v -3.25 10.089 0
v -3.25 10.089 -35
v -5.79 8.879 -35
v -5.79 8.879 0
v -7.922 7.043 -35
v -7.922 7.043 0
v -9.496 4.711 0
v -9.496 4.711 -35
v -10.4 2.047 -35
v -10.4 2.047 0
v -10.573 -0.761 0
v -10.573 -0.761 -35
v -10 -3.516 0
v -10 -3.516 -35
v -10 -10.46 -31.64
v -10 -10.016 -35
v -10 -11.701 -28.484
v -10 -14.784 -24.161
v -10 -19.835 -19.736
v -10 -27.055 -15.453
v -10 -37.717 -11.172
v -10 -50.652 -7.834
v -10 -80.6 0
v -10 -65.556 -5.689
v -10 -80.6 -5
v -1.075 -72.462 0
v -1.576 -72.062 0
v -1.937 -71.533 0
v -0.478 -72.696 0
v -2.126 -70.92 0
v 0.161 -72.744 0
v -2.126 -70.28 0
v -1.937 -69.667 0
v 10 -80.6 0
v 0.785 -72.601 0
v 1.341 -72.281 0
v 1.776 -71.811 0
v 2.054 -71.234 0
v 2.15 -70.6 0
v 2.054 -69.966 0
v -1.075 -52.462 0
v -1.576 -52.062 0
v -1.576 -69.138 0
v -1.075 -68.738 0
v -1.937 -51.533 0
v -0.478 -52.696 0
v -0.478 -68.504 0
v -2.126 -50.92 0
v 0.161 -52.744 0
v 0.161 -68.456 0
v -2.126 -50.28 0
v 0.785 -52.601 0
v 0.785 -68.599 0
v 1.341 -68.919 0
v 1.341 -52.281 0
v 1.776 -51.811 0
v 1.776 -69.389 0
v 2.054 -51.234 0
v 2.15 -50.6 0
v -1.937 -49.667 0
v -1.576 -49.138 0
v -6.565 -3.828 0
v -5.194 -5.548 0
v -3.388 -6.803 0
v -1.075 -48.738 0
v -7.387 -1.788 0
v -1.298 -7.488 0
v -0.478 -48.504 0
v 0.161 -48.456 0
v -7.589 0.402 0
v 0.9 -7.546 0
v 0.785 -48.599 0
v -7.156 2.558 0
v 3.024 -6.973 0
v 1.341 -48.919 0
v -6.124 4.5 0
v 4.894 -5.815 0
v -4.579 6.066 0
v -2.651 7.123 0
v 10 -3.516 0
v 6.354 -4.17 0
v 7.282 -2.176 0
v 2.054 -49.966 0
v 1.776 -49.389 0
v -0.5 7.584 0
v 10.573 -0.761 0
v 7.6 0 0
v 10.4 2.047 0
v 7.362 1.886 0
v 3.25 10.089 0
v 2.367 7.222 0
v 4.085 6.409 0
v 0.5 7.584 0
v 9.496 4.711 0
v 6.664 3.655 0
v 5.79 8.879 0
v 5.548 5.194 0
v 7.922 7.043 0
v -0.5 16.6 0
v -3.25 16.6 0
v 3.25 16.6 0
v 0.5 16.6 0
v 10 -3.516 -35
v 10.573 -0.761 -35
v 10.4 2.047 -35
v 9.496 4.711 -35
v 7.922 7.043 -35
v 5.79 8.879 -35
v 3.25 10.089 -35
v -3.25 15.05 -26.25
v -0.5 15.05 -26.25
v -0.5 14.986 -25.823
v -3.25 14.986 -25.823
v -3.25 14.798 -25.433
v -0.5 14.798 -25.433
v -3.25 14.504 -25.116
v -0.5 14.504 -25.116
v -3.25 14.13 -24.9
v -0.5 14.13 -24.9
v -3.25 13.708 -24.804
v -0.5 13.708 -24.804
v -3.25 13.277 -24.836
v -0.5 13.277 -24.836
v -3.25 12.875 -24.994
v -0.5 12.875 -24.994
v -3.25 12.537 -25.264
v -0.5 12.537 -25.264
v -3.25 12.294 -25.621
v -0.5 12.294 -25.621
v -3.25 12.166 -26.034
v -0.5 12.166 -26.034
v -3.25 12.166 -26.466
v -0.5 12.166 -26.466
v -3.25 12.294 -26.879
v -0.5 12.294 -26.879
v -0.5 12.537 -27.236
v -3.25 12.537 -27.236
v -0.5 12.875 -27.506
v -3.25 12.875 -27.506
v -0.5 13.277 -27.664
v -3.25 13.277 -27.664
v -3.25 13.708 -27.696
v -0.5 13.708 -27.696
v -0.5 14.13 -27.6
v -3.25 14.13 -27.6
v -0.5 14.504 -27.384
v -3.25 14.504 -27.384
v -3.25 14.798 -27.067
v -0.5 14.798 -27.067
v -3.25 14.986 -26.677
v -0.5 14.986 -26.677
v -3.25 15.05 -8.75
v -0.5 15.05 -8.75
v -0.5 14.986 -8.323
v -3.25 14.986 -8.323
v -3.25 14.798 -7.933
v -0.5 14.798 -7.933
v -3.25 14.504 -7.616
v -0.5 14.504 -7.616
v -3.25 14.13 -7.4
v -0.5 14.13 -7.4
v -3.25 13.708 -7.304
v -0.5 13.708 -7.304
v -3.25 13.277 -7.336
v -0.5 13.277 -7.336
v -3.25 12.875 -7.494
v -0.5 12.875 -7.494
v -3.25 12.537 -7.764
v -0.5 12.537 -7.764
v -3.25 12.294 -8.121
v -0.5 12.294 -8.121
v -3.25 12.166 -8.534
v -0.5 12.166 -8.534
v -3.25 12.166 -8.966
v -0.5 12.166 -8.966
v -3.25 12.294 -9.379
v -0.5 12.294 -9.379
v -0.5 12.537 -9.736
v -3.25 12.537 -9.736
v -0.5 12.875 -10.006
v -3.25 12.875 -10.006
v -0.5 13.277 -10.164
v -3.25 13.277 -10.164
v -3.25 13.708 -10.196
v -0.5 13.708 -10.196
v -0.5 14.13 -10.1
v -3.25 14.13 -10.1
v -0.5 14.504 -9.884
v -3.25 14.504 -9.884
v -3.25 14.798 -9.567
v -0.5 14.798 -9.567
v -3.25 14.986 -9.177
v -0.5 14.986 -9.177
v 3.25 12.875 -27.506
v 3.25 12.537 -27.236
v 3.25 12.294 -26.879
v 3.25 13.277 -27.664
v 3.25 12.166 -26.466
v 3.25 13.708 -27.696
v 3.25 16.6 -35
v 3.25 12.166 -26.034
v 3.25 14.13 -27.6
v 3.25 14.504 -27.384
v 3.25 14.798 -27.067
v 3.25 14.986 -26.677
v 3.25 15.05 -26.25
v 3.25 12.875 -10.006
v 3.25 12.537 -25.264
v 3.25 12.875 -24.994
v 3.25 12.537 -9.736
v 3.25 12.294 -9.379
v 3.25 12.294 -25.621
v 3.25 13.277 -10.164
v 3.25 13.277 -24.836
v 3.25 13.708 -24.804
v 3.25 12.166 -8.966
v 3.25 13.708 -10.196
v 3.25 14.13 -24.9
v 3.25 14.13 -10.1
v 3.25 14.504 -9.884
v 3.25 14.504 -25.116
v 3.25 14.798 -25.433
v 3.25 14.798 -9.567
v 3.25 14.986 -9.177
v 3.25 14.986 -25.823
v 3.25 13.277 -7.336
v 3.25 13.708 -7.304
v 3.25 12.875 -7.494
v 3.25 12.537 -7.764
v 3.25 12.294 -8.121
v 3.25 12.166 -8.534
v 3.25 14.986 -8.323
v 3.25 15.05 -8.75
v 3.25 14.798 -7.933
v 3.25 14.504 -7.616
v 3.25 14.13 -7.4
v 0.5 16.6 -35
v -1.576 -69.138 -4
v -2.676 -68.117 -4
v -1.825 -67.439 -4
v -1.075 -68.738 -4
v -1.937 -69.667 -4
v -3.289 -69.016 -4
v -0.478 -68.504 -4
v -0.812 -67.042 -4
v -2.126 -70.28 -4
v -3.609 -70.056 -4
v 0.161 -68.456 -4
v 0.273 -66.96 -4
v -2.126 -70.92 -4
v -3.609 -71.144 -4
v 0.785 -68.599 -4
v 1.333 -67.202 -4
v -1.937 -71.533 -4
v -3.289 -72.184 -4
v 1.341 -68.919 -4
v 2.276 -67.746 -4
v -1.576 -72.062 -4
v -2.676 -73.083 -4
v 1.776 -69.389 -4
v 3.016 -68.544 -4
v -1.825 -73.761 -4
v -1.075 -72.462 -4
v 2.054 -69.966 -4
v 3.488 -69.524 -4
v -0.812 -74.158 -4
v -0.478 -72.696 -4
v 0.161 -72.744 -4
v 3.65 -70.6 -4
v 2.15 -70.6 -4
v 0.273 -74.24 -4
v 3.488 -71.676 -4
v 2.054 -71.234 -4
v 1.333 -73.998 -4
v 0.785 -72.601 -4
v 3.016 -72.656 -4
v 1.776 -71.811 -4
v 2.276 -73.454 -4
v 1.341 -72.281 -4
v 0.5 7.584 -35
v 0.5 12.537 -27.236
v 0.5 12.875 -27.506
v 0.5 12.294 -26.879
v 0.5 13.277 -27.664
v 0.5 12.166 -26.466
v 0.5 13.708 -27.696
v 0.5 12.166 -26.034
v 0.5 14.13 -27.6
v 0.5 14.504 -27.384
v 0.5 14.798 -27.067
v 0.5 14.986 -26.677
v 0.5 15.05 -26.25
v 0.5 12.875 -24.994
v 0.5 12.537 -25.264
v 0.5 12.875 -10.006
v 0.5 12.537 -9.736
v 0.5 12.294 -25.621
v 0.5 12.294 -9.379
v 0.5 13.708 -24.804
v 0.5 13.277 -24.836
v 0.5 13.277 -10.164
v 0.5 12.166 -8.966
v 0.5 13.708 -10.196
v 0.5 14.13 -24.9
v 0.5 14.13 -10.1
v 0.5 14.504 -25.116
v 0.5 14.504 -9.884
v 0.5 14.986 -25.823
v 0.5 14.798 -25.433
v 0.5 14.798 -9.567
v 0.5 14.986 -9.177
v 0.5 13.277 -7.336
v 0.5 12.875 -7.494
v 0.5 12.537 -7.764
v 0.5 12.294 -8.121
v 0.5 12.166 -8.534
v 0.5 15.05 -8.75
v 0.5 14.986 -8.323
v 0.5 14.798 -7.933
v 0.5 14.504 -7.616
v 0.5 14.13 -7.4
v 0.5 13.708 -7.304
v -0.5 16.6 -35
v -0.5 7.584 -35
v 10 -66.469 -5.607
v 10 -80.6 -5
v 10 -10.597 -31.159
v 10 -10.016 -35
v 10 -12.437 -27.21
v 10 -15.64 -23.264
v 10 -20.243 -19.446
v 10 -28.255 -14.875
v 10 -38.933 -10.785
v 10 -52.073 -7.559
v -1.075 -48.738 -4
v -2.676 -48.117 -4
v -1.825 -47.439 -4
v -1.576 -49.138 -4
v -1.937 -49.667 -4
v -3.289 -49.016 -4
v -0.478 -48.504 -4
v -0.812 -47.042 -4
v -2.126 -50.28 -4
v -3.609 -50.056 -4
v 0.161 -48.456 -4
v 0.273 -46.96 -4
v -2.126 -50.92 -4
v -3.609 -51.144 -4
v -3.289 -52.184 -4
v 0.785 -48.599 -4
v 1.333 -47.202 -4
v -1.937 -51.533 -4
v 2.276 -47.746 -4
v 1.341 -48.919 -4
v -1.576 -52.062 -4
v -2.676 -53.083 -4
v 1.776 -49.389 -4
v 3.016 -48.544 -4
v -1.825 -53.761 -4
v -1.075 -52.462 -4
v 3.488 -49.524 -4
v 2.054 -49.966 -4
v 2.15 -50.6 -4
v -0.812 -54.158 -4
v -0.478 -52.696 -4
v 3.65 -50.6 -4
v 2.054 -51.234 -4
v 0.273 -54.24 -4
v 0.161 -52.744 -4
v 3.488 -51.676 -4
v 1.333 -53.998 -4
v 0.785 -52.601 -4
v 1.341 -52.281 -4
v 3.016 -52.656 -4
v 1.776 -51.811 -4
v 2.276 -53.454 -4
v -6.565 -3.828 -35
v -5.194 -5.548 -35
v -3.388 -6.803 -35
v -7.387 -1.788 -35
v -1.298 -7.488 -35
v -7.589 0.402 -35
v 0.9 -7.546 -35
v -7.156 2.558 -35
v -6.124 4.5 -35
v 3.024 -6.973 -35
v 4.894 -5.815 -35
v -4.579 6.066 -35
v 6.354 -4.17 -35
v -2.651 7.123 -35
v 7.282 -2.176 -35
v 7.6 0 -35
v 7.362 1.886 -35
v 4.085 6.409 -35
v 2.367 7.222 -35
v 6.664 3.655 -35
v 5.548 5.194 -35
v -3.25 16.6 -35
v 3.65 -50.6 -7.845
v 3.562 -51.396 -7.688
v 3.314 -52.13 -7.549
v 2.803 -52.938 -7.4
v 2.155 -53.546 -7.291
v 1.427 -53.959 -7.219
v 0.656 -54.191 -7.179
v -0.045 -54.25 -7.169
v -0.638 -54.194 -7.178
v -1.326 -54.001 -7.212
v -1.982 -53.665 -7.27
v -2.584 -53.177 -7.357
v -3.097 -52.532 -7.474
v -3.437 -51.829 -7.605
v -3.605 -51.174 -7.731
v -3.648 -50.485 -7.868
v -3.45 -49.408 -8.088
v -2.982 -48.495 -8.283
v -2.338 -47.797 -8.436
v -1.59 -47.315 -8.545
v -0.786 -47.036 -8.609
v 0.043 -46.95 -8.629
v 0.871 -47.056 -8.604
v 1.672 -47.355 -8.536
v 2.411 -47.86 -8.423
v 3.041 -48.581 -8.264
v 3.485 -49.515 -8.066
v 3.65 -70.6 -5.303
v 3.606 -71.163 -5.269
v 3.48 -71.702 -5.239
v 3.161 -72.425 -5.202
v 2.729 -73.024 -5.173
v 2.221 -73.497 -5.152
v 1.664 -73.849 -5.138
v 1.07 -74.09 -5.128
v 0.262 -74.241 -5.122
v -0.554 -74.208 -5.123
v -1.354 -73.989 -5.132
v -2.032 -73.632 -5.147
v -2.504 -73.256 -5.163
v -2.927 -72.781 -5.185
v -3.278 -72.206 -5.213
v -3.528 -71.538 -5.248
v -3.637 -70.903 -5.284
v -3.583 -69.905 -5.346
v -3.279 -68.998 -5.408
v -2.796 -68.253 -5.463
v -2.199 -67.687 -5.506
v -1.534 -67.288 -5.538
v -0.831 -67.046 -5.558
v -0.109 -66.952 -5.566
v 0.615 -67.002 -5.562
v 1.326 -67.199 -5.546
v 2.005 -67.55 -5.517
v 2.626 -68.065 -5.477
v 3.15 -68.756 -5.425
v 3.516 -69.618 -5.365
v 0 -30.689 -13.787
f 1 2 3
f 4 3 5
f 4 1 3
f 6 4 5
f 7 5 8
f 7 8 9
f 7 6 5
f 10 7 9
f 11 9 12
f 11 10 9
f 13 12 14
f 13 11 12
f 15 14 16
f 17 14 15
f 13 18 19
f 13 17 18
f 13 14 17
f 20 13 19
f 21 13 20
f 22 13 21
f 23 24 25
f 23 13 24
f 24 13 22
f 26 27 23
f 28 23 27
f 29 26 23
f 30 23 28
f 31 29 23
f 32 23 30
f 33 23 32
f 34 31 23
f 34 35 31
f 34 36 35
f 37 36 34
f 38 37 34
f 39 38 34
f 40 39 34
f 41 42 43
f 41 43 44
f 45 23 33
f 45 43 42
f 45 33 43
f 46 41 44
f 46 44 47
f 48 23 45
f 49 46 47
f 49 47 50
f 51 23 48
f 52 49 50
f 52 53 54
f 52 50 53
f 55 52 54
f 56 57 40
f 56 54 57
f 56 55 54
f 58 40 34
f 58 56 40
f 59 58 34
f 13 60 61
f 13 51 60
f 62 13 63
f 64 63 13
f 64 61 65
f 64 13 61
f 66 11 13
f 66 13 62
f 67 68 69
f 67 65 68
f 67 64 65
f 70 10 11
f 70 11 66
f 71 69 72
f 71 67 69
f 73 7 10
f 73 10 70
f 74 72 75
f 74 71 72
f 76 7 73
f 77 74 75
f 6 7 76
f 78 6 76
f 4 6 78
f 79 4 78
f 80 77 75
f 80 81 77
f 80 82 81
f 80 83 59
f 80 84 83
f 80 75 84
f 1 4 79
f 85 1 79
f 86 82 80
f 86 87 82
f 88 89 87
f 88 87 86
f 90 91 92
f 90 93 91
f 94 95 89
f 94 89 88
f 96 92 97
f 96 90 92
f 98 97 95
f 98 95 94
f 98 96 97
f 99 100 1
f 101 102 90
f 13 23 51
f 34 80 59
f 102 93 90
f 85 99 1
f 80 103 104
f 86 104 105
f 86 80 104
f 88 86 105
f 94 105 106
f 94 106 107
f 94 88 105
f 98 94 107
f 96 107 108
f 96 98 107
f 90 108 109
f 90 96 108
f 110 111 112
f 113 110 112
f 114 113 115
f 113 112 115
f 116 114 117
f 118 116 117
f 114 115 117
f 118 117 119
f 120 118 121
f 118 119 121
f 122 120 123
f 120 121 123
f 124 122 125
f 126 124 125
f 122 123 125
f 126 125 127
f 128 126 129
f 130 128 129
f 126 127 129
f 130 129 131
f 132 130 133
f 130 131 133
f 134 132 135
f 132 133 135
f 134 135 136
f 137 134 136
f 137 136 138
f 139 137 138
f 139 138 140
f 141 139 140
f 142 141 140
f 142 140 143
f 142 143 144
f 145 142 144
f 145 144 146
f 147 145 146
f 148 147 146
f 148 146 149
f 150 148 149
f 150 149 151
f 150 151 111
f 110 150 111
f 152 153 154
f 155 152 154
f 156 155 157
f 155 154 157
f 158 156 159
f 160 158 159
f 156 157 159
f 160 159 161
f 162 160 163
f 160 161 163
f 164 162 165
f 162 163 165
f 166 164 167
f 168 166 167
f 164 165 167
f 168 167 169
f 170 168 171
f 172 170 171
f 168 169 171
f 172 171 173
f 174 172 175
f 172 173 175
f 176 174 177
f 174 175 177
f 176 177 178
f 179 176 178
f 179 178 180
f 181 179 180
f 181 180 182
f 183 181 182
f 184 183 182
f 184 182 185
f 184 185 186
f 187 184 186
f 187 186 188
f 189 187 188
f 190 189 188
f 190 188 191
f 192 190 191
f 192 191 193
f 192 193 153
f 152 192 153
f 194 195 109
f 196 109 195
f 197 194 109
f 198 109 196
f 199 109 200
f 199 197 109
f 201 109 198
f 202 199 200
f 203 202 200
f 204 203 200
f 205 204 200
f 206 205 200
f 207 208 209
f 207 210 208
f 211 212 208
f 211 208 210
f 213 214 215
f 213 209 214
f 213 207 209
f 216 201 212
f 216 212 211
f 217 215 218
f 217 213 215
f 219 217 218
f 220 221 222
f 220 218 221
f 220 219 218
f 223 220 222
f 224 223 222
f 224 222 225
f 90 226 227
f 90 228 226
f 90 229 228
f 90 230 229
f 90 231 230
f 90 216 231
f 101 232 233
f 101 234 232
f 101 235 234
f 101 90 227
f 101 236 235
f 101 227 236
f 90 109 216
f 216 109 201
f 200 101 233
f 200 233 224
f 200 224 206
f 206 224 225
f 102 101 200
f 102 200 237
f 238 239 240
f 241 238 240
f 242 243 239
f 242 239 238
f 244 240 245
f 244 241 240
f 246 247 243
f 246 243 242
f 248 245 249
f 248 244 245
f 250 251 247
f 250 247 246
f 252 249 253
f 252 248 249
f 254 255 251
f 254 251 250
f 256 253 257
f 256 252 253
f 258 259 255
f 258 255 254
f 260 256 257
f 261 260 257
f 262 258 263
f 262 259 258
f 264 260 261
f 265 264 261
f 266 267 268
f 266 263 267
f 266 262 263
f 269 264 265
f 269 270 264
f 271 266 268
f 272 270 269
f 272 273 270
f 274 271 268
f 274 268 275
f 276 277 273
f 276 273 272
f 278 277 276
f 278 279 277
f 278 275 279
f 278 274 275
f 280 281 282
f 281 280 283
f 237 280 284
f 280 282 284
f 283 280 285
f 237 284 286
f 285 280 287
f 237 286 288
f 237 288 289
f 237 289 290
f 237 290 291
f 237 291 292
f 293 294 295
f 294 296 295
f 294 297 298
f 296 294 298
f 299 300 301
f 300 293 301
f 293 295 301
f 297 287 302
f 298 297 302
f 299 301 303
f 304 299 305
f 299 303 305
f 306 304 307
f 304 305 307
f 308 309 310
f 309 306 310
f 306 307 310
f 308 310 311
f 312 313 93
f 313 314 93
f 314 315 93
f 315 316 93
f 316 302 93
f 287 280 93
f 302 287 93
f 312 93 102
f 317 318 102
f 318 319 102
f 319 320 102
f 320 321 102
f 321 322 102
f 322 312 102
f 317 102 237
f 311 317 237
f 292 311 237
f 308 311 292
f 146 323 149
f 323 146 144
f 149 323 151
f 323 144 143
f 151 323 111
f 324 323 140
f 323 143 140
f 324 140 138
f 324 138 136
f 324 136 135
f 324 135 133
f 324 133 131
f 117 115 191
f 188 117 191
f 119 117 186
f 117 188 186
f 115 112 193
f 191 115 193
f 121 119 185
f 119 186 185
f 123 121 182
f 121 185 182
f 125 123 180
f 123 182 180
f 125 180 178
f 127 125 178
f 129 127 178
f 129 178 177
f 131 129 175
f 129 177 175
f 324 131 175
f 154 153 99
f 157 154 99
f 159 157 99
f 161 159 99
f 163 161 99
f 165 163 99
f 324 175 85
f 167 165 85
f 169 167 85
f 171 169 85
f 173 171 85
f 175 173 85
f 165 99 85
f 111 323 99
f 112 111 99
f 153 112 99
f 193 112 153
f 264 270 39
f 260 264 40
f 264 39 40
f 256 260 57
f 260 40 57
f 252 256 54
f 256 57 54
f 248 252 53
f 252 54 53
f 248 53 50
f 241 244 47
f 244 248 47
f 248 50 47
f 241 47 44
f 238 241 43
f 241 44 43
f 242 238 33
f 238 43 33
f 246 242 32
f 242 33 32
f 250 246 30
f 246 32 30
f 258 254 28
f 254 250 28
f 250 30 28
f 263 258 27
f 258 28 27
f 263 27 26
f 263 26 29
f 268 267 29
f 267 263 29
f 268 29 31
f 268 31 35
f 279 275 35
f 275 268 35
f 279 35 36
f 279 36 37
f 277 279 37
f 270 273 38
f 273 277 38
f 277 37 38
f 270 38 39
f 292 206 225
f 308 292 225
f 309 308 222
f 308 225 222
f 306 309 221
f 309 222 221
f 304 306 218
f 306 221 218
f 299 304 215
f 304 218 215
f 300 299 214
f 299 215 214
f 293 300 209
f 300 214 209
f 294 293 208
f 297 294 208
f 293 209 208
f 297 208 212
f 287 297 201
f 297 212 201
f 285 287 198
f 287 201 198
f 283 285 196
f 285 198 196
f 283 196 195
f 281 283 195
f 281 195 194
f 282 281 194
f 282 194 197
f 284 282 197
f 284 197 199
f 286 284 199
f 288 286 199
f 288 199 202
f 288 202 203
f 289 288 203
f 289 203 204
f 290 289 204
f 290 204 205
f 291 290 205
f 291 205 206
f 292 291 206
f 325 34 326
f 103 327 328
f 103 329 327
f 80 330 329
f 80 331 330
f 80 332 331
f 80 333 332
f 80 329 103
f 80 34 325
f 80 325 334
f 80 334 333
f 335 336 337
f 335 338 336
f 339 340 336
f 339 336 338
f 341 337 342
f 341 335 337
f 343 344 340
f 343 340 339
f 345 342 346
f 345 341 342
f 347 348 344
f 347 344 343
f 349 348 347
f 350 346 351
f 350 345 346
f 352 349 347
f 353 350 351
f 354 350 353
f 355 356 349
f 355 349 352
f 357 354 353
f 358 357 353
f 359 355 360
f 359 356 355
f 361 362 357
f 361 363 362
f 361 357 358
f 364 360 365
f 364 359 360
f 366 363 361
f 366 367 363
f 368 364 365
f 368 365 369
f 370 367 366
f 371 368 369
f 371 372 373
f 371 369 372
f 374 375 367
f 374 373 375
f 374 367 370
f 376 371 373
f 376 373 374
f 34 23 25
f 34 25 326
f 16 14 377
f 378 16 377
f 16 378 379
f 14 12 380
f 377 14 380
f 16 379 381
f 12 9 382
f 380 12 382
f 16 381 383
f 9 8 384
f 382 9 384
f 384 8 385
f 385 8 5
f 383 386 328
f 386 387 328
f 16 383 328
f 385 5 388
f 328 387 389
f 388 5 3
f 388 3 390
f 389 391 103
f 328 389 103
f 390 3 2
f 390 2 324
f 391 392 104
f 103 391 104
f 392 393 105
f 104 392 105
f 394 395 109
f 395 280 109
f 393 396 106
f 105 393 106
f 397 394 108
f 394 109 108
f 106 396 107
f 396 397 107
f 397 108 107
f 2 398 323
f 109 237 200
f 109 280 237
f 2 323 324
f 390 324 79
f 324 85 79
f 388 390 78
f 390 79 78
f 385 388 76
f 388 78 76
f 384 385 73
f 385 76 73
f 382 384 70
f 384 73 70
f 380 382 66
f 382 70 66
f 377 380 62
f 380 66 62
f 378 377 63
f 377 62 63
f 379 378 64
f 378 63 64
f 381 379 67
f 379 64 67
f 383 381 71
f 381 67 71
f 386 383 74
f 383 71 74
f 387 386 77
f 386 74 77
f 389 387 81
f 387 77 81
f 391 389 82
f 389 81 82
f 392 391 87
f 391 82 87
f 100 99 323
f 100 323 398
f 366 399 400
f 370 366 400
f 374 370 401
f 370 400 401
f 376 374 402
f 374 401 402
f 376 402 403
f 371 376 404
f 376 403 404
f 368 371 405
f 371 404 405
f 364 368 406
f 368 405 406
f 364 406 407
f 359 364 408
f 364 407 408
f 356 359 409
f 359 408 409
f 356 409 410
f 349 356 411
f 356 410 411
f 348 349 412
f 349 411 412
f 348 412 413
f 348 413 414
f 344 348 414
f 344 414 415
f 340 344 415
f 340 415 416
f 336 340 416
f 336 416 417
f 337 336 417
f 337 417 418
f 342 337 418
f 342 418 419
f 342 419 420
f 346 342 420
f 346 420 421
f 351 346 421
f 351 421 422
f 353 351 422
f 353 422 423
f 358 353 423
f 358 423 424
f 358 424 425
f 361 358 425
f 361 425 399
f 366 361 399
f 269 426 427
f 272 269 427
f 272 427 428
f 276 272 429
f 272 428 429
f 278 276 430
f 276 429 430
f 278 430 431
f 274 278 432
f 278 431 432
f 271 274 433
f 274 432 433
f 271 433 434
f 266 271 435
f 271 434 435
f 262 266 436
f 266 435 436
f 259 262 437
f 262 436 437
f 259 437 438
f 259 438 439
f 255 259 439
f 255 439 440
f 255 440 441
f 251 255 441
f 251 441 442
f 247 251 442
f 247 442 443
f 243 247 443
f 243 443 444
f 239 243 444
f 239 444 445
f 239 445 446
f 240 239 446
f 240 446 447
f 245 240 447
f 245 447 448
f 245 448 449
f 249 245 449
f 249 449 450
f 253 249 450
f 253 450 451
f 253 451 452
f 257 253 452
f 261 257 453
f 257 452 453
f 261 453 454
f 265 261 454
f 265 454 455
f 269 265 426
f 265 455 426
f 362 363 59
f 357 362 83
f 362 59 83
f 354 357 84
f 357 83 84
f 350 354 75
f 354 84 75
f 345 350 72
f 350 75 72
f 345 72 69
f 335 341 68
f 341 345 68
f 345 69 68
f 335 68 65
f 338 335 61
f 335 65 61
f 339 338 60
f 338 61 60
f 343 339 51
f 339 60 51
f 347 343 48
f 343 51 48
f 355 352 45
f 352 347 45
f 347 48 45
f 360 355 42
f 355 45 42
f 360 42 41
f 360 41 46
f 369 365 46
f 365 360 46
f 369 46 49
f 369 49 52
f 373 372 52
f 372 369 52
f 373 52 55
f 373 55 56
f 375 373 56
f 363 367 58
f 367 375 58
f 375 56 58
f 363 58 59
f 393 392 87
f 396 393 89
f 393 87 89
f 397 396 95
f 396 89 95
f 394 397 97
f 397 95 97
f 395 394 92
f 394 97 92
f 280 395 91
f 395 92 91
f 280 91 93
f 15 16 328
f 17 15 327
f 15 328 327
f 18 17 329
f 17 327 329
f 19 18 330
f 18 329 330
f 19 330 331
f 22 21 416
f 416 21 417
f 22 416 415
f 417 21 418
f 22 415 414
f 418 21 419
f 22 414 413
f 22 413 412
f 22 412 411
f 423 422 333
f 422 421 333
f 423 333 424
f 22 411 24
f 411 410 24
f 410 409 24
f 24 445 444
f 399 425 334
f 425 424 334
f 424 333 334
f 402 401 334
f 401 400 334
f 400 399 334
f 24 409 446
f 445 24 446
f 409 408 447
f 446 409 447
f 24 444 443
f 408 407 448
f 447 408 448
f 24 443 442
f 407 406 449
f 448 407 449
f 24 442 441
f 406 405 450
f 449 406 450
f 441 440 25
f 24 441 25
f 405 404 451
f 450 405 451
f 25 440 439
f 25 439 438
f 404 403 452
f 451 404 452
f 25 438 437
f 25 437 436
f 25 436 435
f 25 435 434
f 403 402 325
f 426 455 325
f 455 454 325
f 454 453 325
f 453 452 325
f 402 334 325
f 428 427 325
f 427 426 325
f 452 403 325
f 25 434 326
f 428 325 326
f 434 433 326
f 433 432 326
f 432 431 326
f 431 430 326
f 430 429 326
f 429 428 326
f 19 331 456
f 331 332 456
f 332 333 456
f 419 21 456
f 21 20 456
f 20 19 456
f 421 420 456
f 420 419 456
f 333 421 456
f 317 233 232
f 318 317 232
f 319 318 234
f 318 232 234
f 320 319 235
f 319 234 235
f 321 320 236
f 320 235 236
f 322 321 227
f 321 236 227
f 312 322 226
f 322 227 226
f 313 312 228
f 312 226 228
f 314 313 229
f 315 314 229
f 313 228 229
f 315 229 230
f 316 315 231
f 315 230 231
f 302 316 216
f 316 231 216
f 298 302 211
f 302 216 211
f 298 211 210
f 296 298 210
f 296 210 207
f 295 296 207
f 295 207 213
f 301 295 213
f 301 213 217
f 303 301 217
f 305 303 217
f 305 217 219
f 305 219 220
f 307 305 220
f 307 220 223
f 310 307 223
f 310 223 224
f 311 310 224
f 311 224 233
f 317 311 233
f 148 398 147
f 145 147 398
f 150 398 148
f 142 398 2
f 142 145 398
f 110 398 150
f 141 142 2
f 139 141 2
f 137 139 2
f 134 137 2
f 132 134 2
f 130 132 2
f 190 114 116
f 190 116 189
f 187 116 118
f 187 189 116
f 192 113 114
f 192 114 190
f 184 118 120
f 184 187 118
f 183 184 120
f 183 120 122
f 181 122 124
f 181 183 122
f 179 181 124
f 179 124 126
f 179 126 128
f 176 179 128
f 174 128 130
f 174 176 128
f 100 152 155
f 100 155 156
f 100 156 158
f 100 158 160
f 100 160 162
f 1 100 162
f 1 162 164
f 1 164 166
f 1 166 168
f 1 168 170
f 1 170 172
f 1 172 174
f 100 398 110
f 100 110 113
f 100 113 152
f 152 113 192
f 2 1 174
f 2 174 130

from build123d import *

# Parameters (mm, degrees)
F1_DEPTH  = 35
F0_R      = 7.6
F2_DEPTH  = 35
F3_R      = 2.15
F4_DEPTH  = 35.001
F5_R      = 3.65
F5_R_2    = 2.15
F6_DEPTH  = 31
F8_DEPTH  = 20.601
F9_W      = 0.5
F9_H      = 2
F10_DEPTH = 35.0010001
F11_R     = 1.45
F12_DEPTH = 13.851


with BuildPart() as f1:
    # F0 (on Top) → F1 (new body)
    with BuildSketch(Plane.XY):
        with BuildLine():
            ThreePointArc((10, -3.5156791662), (0, -10.6), (-10, -3.5156791662))
            Line((-10, -3.5156791662), (-10, -80.6))
            Line((-10, -80.6), (10, -80.6))
            Line((10, -80.6), (10, -3.5156791662))
        make_face()
    extrude(amount=-F1_DEPTH)

    # F0 (on Top) → F2 (join)
    with BuildSketch(Plane.XY):
        with BuildLine():
            Line((-3.25, 16.6), (-3.25, 10.0894747138))
            ThreePointArc((-3.25, 10.0894747138), (-9.4955609642, 4.7110850104), (-10, -3.5156791662))
            ThreePointArc((-10, -3.5156791662), (0, -10.6), (10, -3.5156791662))
            ThreePointArc((10, -3.5156791662), (9.4955609642, 4.7110850104), (3.25, 10.0894747138))
            Line((3.25, 10.0894747138), (3.25, 16.6))
            Line((3.25, 16.6), (-3.25, 16.6))
        make_face()
        Circle(F0_R, mode=Mode.SUBTRACT)
    extrude(amount=-F2_DEPTH)

    # F3 (on face) → F4 (cut, through all)
    with BuildSketch(Plane.XY):
        with Locations((0, -50.6)):
            Circle(F3_R)
        with Locations((0, -70.6)):
            Circle(F3_R)
    extrude(amount=-F4_DEPTH, mode=Mode.SUBTRACT)

    # F5 (on face) → F6 (cut)
    with BuildSketch(Plane(origin=(0, 0, -35), x_dir=(1, 0, 0), z_dir=(0, 0, -1))):
        with Locations((0, 70.6)):
            Circle(F5_R)
        with Locations((0, 70.6)):
            Circle(F5_R_2, mode=Mode.SUBTRACT)
        with Locations((0, 50.6)):
            Circle(F5_R)
        with Locations((0, 50.6)):
            Circle(F5_R_2, mode=Mode.SUBTRACT)
    extrude(amount=-F6_DEPTH, mode=Mode.SUBTRACT)

    # F7 (on face) → F8 (cut, through all)
    with BuildSketch(Plane.YZ.offset(10)):
        with BuildLine():
            Line((-80.6, -35), (-10.0156791662, -35))
            add(Edge.make_bspline(
                [(-10.0156791662, -35), (-10.0156791662, -5), (-80.6, -5)],
                knots=[0, 0, 0, 1.5707963268, 1.5707963268, 1.5707963268], degree=2, weights=[1, 0.7071067812, 1]))
            Line((-80.6, -5), (-80.6, -35))
        make_face()
    extrude(amount=-F8_DEPTH, mode=Mode.SUBTRACT)

    # F9 (on face) → F10 (cut, through all)
    with BuildSketch(Plane.XY):
        with BuildLine():
            Line((0.5, 16.6), (0, 16.6))
            Line((0, 16.6), (0, 7.6))
            ThreePointArc((0, 7.6), (0.2501355147, 7.5958825836), (0.5, 7.5835347959))
            Line((0.5, 7.5835347959), (0.5, 16.6))
        make_face()
        with BuildLine():
            Line((0, 0), (0, 7.6))
            ThreePointArc((0, 7.6), (-0.2501355147, 7.5958825836), (-0.5, 7.5835347959))
            Line((-0.5, 7.5835347959), (-0.5, 0))
            Line((-0.5, 0), (0, 0))
        make_face()
        with Locations((-0.25, 17.6)):
            Rectangle(F9_W, F9_H)
        with Locations((0.25, 17.6)):
            Rectangle(F9_W, F9_H)
        with BuildLine():
            ThreePointArc((0.5, 7.5835347959), (0.2501355147, 7.5958825836), (0, 7.6))
            Line((0, 7.6), (0, 0))
            Line((0, 0), (0.5, 0))
            Line((0.5, 0), (0.5, 7.5835347959))
        make_face()
        with BuildLine():
            Line((0, 7.6), (0, 16.6))
            Line((0, 16.6), (-0.5, 16.6))
            Line((-0.5, 16.6), (-0.5, 7.5835347959))
            ThreePointArc((-0.5, 7.5835347959), (-0.2501355147, 7.5958825836), (0, 7.6))
        make_face()
    extrude(amount=-F10_DEPTH, mode=Mode.SUBTRACT)

    # F11 (on face) → F12 (cut, through all)
    with BuildSketch(Plane.YZ.offset(3.25)):
        with Locations((13.6, -8.75)):
            Circle(F11_R)
        with Locations((13.6, -26.25)):
            Circle(F11_R)
    extrude(amount=-F12_DEPTH, mode=Mode.SUBTRACT)


solid = f1.part
